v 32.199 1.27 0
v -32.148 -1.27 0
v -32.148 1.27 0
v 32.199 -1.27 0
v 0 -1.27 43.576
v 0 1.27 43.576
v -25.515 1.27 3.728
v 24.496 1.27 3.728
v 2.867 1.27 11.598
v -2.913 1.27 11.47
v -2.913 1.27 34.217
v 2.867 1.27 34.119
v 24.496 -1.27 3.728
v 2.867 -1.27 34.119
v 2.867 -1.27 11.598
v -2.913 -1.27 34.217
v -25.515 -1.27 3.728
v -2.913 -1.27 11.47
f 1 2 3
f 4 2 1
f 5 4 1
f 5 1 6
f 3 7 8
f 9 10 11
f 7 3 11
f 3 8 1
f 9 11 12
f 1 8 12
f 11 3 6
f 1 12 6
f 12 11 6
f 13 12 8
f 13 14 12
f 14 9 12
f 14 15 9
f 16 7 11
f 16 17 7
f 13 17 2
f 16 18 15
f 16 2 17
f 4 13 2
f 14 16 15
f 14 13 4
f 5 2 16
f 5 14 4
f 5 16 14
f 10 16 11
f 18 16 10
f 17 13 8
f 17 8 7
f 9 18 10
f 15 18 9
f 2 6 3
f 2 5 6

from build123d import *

# Parameters (mm, degrees)
F1_DEPTH = 1.27


with BuildPart() as f1:
    # F0 (on Front) → F1 (new body, symmetric)
    with BuildSketch(Plane.XZ):
        Polygon((-32.148205, 0), (0, 0), (32.198641, 0), (0, 43.575902), align=None)
        Polygon((24.49552, 3.727856), (-25.514841, 3.727856), (-2.913308, 34.21729), (-2.913308, 11.470481), (2.866663, 11.597541), (2.866663, 34.119293), align=None, mode=Mode.SUBTRACT)
    extrude(amount=F1_DEPTH, both=True)


solid = f1.part
